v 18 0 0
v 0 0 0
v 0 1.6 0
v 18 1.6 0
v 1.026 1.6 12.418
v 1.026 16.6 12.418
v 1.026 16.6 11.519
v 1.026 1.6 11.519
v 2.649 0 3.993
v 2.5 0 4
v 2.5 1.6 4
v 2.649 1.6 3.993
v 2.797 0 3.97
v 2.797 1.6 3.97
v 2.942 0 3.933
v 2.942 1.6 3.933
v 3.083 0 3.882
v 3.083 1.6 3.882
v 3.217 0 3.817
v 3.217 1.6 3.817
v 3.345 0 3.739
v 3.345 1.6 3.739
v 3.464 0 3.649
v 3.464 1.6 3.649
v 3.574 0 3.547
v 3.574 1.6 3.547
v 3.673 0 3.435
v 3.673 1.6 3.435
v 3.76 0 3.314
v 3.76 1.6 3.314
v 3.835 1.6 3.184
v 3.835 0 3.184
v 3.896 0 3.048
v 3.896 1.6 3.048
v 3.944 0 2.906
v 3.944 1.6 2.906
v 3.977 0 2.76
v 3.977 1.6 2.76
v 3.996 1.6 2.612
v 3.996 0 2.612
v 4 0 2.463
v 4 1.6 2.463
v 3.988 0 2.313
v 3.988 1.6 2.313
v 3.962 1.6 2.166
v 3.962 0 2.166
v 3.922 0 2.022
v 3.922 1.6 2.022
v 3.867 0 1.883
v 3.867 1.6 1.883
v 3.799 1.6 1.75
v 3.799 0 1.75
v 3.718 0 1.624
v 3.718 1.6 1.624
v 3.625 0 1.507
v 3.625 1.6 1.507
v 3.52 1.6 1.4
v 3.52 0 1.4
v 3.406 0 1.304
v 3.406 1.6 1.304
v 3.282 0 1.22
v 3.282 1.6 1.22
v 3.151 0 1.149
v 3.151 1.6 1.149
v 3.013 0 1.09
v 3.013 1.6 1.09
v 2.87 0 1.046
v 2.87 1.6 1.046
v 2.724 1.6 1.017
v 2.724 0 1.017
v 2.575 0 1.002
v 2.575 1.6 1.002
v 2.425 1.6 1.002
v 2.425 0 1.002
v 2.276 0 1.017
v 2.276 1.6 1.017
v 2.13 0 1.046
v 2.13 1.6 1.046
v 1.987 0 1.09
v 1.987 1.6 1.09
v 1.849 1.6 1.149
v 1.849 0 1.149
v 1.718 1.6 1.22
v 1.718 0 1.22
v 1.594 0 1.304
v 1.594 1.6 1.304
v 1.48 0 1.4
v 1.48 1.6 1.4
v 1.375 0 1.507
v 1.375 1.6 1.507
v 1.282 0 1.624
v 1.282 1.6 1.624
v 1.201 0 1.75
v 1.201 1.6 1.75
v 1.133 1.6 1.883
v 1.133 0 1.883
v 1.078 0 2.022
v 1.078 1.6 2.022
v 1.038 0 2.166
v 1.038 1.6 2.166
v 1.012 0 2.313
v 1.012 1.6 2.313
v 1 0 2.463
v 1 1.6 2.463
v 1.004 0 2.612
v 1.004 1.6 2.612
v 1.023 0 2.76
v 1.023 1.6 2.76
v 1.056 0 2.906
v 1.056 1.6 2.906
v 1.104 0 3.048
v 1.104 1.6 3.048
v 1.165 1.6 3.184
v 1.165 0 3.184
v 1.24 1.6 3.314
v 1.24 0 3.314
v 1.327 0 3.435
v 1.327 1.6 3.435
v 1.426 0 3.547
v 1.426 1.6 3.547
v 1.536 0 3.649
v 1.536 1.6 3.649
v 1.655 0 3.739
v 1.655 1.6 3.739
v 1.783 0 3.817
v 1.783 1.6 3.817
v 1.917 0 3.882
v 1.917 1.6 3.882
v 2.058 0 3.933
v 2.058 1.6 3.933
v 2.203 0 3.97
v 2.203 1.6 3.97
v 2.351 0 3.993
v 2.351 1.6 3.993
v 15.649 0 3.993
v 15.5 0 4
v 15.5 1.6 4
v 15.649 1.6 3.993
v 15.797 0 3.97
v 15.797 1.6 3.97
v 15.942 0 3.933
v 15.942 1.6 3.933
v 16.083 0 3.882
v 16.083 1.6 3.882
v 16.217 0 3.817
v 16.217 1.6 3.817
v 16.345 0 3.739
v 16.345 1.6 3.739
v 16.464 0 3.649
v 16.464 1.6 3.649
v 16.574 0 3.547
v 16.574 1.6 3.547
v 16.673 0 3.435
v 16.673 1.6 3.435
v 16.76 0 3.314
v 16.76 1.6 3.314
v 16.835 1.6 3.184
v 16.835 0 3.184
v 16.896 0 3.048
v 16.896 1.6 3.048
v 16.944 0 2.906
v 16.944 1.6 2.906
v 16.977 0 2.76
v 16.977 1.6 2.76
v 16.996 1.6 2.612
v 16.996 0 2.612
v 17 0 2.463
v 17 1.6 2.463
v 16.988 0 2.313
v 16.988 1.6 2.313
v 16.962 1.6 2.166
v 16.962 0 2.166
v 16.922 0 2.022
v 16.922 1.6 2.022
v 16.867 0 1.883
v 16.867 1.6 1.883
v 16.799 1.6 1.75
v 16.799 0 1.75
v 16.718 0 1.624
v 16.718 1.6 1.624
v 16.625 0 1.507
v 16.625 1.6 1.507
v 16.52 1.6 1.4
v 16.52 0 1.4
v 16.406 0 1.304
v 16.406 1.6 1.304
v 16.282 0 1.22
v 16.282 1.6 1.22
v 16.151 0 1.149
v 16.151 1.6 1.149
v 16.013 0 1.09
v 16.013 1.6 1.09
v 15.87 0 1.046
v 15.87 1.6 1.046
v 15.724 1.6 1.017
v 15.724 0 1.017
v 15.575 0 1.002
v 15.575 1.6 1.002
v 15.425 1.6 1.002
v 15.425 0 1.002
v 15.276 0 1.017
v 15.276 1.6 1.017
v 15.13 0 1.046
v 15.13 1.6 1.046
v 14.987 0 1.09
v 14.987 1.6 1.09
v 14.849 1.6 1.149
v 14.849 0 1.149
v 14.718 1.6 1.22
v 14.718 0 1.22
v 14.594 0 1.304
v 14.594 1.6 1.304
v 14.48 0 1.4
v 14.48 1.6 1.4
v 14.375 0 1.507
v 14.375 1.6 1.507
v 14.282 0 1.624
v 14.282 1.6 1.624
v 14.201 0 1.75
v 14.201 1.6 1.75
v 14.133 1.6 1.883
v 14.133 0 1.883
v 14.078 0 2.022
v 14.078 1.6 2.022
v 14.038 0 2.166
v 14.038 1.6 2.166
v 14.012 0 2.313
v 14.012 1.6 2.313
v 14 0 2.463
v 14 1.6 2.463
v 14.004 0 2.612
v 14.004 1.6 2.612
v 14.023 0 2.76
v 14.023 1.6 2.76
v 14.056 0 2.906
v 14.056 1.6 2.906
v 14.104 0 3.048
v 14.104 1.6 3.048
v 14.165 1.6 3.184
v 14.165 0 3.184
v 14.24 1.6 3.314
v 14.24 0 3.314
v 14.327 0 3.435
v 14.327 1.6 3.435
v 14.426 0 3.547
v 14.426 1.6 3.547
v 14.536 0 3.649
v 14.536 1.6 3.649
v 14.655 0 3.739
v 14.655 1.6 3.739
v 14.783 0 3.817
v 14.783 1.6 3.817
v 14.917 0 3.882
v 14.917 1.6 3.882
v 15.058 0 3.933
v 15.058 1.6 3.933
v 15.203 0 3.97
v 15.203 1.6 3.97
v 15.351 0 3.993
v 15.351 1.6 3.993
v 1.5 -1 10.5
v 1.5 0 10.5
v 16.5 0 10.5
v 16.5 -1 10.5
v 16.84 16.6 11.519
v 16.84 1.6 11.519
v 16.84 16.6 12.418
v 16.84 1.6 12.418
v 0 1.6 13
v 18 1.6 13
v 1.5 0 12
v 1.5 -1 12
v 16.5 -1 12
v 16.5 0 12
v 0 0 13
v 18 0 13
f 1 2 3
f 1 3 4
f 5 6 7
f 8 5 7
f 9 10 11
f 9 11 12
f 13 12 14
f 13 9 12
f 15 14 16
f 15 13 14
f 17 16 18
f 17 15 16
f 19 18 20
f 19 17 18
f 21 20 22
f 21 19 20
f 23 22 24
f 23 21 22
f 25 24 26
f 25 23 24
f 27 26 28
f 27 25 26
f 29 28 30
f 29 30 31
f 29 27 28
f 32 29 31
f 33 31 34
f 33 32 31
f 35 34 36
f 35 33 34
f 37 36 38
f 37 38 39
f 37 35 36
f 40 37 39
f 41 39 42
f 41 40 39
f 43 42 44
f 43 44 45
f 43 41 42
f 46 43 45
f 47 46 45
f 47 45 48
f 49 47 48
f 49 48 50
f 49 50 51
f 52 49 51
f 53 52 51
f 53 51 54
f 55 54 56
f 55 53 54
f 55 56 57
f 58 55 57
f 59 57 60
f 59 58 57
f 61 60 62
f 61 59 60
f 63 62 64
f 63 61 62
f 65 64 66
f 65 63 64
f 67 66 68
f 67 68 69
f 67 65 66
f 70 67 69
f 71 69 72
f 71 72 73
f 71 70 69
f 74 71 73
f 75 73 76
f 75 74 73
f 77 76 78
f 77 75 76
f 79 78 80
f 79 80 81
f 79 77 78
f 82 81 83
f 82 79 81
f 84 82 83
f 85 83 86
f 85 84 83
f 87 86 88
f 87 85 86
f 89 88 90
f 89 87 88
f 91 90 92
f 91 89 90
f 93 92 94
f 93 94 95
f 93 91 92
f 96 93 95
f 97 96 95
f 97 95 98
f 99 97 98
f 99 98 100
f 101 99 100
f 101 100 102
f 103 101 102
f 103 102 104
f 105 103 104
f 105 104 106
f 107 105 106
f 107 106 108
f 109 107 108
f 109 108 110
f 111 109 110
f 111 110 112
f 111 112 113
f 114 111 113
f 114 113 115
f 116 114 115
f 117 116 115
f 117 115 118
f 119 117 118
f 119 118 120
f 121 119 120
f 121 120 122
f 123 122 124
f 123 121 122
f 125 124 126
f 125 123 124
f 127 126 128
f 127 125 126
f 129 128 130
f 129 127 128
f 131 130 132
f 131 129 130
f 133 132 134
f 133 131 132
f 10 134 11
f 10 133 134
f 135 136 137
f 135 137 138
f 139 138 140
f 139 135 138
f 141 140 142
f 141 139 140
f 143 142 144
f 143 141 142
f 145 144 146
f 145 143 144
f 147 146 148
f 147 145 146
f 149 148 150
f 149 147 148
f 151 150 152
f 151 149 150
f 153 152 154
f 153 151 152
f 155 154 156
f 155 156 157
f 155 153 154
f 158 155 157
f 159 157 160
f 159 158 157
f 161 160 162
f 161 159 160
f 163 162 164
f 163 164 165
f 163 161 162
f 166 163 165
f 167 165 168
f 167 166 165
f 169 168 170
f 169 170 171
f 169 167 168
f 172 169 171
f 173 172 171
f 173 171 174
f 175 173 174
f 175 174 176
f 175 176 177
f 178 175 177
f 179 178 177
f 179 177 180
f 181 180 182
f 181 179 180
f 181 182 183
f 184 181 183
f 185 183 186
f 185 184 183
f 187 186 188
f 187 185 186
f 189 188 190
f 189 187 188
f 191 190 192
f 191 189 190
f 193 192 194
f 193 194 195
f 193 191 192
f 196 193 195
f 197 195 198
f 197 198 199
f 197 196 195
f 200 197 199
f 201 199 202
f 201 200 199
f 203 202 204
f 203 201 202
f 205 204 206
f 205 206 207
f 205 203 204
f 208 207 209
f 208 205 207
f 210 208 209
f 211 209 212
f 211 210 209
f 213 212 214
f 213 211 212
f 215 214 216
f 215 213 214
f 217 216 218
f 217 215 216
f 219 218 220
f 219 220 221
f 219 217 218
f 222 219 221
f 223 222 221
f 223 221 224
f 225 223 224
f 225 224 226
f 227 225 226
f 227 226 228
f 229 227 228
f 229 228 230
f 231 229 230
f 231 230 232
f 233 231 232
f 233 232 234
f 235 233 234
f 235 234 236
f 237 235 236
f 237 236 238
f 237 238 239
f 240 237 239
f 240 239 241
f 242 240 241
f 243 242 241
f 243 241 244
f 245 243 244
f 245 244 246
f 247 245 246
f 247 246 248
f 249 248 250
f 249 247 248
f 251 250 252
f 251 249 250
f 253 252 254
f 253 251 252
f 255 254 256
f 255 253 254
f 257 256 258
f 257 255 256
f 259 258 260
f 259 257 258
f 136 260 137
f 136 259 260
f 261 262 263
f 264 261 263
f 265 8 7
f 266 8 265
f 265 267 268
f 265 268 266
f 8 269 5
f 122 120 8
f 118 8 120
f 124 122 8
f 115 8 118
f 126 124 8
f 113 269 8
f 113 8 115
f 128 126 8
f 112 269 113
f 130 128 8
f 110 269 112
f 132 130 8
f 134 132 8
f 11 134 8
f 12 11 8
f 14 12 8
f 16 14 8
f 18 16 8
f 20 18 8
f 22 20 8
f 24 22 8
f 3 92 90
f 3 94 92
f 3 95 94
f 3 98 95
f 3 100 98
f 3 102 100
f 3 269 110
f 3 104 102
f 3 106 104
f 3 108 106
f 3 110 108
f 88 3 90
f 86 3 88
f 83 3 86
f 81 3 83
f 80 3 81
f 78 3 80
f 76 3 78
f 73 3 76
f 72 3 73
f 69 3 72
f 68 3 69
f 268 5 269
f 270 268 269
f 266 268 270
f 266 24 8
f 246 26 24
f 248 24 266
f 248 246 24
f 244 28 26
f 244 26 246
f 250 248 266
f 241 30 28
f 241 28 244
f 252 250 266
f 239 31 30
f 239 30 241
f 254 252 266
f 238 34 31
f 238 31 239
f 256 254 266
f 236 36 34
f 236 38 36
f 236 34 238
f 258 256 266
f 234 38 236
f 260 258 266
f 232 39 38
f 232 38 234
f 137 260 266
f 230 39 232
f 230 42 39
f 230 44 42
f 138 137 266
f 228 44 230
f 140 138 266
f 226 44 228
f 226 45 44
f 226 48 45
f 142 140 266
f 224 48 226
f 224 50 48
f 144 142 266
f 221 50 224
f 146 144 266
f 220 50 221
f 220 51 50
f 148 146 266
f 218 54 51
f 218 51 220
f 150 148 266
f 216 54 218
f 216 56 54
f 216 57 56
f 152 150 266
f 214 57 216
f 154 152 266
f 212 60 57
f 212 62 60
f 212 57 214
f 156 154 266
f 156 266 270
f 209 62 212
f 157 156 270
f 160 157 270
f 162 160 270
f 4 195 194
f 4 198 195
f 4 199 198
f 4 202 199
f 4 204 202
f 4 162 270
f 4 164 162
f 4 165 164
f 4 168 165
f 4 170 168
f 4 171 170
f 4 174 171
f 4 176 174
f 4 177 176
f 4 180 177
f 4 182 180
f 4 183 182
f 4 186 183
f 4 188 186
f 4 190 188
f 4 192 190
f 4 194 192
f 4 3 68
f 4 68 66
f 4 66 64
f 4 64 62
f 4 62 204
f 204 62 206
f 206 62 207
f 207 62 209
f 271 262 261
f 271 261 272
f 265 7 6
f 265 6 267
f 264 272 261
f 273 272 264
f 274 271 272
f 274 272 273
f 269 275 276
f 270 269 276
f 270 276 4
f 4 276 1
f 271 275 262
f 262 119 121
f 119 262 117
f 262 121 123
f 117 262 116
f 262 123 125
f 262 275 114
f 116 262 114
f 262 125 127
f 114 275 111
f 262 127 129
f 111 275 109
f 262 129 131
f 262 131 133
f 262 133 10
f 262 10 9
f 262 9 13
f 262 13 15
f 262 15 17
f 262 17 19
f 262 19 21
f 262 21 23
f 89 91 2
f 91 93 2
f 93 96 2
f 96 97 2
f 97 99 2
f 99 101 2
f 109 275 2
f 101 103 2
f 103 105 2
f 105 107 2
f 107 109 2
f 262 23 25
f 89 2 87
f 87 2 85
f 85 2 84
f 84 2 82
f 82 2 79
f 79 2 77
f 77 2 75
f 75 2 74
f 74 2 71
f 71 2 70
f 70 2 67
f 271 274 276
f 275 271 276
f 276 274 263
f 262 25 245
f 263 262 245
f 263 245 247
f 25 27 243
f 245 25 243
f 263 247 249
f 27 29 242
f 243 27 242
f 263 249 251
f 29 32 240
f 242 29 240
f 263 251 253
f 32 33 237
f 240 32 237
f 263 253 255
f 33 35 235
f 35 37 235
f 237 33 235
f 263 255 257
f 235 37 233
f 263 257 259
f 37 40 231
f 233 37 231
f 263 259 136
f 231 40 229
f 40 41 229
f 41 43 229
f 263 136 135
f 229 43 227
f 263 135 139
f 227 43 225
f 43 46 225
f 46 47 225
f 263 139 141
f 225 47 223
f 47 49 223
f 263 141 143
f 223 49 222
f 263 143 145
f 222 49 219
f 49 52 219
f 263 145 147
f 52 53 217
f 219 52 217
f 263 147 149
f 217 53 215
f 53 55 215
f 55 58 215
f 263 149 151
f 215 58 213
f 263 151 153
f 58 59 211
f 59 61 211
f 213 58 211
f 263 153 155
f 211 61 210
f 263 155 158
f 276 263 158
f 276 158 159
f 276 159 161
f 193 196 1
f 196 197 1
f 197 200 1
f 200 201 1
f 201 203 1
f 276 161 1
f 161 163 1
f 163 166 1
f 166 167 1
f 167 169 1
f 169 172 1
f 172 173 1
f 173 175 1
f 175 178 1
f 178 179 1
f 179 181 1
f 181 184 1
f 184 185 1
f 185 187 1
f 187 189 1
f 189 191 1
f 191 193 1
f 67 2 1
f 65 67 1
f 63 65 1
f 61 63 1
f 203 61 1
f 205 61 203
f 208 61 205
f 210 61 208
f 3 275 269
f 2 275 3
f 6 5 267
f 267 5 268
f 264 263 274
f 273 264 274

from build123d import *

# Parameters (mm, degrees)
SKETCH_1_W      = 18
SKETCH_1_H      = 13
SKETCH_1_R      = 1.5
EXTRUDE_1_DEPTH = 1.6
SKETCH_2_W      = 15
SKETCH_2_H      = 1.5
EXTRUDE_2_DEPTH = 1
SKETCH_3_W      = 15.814161569
SKETCH_3_H      = 0.898910236
EXTRUDE_3_DEPTH = 15


with BuildPart() as part:
    # 草图1 → 凸台-拉伸1 (new body)
    with BuildSketch(Plane(origin=(0, 0, 0), x_dir=(1, 0, 0), z_dir=(0, 1, 0))):
        with Locations((9, -6.5)):
            Rectangle(SKETCH_1_W, SKETCH_1_H)
        with Locations(Location((2.5, -2.5, 0), (0, 0, 270))):
            Circle(SKETCH_1_R, mode=Mode.SUBTRACT)
        with Locations(Location((15.5, -2.5, 0), (0, 0, 270))):
            Circle(SKETCH_1_R, mode=Mode.SUBTRACT)
    extrude(amount=EXTRUDE_1_DEPTH)

    # 草图2 → 凸台-拉伸2 (add)
    with BuildSketch(Plane.XZ):
        with Locations((9, 11.25)):
            Rectangle(SKETCH_2_W, SKETCH_2_H)
    extrude(amount=EXTRUDE_2_DEPTH)

    # 草图3 → 凸台-拉伸3 (add)
    with BuildSketch(Plane(origin=(0, 1.6, 0), x_dir=(1, 0, 0), z_dir=(0, 1, 0))):
        with Locations((8.933414057, -11.968370606)):
            Rectangle(SKETCH_3_W, SKETCH_3_H)
    extrude(amount=EXTRUDE_3_DEPTH)


solid = part.part
